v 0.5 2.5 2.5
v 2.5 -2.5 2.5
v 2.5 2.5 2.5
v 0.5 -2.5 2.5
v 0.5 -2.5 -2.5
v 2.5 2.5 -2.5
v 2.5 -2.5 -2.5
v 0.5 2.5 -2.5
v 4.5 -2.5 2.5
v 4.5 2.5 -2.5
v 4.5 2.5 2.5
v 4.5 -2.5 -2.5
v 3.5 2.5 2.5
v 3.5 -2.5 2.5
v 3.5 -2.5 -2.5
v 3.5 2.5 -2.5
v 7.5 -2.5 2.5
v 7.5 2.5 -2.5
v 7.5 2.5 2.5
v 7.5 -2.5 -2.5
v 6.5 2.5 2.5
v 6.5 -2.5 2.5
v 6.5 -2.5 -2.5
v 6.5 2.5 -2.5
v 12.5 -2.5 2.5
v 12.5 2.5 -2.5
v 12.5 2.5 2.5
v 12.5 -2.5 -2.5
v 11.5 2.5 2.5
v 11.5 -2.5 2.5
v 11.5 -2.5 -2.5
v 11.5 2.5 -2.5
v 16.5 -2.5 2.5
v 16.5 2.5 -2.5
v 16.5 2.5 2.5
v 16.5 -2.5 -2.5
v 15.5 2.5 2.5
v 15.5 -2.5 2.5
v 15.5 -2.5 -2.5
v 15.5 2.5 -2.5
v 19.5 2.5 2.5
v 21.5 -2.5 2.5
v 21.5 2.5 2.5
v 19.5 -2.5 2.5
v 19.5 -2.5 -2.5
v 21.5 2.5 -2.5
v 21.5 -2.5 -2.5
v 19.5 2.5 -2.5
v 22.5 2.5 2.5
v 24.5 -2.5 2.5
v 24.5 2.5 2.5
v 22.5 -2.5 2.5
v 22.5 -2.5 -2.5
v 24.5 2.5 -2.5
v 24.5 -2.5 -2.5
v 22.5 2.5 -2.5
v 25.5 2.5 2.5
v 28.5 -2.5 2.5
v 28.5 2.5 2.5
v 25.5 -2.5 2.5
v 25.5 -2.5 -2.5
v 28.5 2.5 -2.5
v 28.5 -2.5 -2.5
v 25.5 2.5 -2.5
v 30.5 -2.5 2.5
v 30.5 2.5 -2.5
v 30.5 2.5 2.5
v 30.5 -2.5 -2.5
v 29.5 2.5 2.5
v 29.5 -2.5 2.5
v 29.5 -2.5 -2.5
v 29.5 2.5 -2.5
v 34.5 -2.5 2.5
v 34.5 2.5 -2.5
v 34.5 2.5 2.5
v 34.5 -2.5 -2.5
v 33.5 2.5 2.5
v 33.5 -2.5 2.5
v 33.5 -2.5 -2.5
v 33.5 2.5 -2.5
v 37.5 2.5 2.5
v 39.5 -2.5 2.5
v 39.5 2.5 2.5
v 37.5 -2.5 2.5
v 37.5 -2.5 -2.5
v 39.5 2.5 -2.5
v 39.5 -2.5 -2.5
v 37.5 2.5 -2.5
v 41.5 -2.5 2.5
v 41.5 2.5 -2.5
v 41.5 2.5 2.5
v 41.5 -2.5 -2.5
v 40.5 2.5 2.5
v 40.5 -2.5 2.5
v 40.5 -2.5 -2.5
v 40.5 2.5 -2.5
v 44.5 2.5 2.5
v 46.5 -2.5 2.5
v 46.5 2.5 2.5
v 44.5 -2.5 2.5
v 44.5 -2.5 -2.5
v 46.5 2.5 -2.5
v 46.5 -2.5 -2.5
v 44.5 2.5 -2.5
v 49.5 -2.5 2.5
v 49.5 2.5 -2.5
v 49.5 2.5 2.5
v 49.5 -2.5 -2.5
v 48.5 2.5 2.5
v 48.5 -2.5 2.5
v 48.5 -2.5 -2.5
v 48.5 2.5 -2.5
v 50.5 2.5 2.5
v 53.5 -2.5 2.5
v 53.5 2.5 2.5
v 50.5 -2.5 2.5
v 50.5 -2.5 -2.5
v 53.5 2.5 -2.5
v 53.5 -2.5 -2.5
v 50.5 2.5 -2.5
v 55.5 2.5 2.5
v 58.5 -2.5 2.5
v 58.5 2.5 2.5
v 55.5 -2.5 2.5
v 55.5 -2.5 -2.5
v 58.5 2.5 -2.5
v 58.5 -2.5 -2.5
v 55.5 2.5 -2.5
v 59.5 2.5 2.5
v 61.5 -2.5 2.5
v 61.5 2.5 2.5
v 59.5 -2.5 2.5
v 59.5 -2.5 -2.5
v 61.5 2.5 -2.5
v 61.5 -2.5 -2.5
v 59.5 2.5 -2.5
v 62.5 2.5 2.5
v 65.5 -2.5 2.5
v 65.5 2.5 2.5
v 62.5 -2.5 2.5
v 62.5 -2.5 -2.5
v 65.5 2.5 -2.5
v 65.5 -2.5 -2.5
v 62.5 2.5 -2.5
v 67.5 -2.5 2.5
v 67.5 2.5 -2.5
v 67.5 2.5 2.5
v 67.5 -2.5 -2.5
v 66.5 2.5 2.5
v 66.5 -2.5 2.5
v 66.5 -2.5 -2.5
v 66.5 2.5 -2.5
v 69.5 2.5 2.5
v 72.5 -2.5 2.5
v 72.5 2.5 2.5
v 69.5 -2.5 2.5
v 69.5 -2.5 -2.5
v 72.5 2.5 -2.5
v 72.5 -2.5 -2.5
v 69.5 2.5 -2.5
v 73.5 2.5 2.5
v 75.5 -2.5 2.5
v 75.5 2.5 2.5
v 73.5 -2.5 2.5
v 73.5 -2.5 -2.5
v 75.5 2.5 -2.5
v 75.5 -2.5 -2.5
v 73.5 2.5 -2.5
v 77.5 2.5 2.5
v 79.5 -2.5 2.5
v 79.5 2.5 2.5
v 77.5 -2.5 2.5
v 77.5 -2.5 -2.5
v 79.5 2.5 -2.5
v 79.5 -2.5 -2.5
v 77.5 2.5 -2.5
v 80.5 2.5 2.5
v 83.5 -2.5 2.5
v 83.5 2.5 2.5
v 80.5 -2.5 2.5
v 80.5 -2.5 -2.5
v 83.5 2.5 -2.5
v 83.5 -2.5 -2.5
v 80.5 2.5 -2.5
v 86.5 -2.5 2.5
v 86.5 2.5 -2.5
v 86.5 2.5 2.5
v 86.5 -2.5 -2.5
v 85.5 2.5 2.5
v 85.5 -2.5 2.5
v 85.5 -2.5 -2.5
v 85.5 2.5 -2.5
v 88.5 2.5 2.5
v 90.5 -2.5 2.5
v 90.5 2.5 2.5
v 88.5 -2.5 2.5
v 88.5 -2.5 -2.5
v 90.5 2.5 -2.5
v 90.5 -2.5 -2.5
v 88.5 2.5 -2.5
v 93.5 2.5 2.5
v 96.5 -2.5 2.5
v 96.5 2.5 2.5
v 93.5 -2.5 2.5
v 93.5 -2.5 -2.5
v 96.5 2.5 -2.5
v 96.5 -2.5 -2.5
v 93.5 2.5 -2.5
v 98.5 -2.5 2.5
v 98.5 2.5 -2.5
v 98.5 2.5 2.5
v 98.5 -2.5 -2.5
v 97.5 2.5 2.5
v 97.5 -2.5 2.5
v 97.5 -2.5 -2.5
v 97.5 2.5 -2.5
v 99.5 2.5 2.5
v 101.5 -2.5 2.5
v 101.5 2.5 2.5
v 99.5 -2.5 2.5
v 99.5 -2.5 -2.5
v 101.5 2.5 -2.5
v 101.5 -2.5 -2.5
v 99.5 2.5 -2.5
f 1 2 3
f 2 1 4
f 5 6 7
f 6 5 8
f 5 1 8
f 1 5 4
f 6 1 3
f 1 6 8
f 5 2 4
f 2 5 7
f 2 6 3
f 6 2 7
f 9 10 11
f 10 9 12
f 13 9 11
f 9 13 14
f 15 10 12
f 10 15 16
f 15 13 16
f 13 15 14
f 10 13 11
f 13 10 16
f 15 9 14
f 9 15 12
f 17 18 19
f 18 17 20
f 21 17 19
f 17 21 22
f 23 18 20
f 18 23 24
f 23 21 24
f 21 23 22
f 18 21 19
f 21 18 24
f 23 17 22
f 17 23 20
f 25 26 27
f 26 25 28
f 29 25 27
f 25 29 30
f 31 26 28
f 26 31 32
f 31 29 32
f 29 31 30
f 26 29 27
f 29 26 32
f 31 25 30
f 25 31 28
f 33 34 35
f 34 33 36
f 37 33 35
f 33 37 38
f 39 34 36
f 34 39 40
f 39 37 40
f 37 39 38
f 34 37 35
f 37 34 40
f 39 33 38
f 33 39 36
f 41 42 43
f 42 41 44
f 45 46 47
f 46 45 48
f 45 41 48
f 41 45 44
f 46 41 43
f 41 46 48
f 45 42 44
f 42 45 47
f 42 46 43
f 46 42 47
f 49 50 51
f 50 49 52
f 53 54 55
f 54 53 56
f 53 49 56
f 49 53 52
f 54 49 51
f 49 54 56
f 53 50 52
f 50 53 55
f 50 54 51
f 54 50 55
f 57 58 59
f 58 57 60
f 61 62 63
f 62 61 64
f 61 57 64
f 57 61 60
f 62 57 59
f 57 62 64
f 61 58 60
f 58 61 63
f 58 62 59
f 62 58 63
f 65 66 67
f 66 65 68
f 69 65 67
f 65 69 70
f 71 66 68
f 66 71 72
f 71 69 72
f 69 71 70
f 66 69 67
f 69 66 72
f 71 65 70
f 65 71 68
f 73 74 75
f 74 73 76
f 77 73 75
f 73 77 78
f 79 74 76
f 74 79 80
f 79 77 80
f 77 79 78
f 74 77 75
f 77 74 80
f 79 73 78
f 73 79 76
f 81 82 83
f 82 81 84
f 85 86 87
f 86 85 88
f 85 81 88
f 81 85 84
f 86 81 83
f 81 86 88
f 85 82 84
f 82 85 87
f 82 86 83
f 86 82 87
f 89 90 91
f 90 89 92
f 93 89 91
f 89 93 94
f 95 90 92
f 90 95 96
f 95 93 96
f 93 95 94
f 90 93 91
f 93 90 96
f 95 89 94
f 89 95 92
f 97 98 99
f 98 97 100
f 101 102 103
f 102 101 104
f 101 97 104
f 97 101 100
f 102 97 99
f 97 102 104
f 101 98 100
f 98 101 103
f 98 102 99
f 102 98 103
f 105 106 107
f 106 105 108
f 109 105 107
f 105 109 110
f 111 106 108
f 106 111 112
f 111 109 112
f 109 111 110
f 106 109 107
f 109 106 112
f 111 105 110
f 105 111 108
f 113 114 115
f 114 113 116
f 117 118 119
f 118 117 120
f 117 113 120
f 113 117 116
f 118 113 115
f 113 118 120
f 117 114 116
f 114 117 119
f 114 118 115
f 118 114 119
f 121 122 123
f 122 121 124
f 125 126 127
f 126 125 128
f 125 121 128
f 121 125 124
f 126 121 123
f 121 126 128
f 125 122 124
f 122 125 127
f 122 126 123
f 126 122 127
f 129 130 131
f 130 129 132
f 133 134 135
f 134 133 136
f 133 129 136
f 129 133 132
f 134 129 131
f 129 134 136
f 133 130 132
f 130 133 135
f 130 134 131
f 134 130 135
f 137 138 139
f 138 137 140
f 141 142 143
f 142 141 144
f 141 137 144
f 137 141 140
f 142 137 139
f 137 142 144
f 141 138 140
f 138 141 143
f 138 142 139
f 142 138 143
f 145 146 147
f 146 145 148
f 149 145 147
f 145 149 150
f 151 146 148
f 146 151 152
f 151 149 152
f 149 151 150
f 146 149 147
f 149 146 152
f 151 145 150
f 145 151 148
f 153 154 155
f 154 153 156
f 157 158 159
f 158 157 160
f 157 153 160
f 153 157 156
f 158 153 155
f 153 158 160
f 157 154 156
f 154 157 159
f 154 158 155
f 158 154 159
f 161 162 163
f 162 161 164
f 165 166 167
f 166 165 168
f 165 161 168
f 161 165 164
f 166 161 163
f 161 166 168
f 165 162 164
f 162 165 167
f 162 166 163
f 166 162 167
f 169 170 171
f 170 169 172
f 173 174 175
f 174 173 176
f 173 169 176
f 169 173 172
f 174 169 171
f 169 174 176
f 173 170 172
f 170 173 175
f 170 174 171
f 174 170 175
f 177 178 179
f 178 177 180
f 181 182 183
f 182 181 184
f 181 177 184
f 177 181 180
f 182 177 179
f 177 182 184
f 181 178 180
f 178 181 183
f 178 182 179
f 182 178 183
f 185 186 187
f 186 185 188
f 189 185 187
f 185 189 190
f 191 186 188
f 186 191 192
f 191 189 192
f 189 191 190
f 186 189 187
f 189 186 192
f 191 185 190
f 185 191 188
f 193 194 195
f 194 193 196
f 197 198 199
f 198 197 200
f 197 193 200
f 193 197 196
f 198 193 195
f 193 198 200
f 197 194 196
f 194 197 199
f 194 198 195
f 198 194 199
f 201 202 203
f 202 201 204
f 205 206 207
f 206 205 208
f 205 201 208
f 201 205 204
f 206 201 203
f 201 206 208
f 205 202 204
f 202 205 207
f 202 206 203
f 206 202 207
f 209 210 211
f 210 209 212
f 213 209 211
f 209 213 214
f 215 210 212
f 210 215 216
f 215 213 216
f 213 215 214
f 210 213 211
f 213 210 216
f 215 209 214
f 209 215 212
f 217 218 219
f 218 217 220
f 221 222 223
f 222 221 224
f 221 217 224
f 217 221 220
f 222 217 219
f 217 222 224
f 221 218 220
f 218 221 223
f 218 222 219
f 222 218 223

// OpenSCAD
translate([1,0,0])  cube(size = [1,5,5], center=true);
translate([2,0,0])  cube(size = [1,5,5], center=true);
translate([4,0,0])  cube(size = [1,5,5], center=true);
translate([7,0,0])  cube(size = [1,5,5], center=true);
translate([12,0,0])  cube(size = [1,5,5], center=true);
translate([16,0,0])  cube(size = [1,5,5], center=true);
translate([20,0,0])  cube(size = [1,5,5], center=true);
translate([21,0,0])  cube(size = [1,5,5], center=true);
translate([23,0,0])  cube(size = [1,5,5], center=true);
translate([24,0,0])  cube(size = [1,5,5], center=true);
translate([26,0,0])  cube(size = [1,5,5], center=true);
translate([27,0,0])  cube(size = [1,5,5], center=true);
translate([28,0,0])  cube(size = [1,5,5], center=true);
translate([30,0,0])  cube(size = [1,5,5], center=true);
translate([34,0,0])  cube(size = [1,5,5], center=true);
translate([38,0,0])  cube(size = [1,5,5], center=true);
translate([39,0,0])  cube(size = [1,5,5], center=true);
translate([41,0,0])  cube(size = [1,5,5], center=true);
translate([45,0,0])  cube(size = [1,5,5], center=true);
translate([46,0,0])  cube(size = [1,5,5], center=true);
translate([49,0,0])  cube(size = [1,5,5], center=true);
translate([51,0,0])  cube(size = [1,5,5], center=true);
translate([52,0,0])  cube(size = [1,5,5], center=true);
translate([53,0,0])  cube(size = [1,5,5], center=true);
translate([56,0,0])  cube(size = [1,5,5], center=true);
translate([57,0,0])  cube(size = [1,5,5], center=true);
translate([58,0,0])  cube(size = [1,5,5], center=true);
translate([60,0,0])  cube(size = [1,5,5], center=true);
translate([61,0,0])  cube(size = [1,5,5], center=true);
translate([63,0,0])  cube(size = [1,5,5], center=true);
translate([64,0,0])  cube(size = [1,5,5], center=true);
translate([65,0,0])  cube(size = [1,5,5], center=true);
translate([67,0,0])  cube(size = [1,5,5], center=true);
translate([70,0,0])  cube(size = [1,5,5], center=true);
translate([71,0,0])  cube(size = [1,5,5], center=true);
translate([72,0,0])  cube(size = [1,5,5], center=true);
translate([74,0,0])  cube(size = [1,5,5], center=true);
translate([75,0,0])  cube(size = [1,5,5], center=true);
translate([78,0,0])  cube(size = [1,5,5], center=true);
translate([79,0,0])  cube(size = [1,5,5], center=true);
translate([81,0,0])  cube(size = [1,5,5], center=true);
translate([82,0,0])  cube(size = [1,5,5], center=true);
translate([83,0,0])  cube(size = [1,5,5], center=true);
translate([86,0,0])  cube(size = [1,5,5], center=true);
translate([89,0,0])  cube(size = [1,5,5], center=true);
translate([90,0,0])  cube(size = [1,5,5], center=true);
translate([94,0,0])  cube(size = [1,5,5], center=true);
translate([95,0,0])  cube(size = [1,5,5], center=true);
translate([96,0,0])  cube(size = [1,5,5], center=true);
translate([98,0,0])  cube(size = [1,5,5], center=true);
translate([100,0,0])  cube(size = [1,5,5], center=true);
translate([101,0,0])  cube(size = [1,5,5], center=true);
